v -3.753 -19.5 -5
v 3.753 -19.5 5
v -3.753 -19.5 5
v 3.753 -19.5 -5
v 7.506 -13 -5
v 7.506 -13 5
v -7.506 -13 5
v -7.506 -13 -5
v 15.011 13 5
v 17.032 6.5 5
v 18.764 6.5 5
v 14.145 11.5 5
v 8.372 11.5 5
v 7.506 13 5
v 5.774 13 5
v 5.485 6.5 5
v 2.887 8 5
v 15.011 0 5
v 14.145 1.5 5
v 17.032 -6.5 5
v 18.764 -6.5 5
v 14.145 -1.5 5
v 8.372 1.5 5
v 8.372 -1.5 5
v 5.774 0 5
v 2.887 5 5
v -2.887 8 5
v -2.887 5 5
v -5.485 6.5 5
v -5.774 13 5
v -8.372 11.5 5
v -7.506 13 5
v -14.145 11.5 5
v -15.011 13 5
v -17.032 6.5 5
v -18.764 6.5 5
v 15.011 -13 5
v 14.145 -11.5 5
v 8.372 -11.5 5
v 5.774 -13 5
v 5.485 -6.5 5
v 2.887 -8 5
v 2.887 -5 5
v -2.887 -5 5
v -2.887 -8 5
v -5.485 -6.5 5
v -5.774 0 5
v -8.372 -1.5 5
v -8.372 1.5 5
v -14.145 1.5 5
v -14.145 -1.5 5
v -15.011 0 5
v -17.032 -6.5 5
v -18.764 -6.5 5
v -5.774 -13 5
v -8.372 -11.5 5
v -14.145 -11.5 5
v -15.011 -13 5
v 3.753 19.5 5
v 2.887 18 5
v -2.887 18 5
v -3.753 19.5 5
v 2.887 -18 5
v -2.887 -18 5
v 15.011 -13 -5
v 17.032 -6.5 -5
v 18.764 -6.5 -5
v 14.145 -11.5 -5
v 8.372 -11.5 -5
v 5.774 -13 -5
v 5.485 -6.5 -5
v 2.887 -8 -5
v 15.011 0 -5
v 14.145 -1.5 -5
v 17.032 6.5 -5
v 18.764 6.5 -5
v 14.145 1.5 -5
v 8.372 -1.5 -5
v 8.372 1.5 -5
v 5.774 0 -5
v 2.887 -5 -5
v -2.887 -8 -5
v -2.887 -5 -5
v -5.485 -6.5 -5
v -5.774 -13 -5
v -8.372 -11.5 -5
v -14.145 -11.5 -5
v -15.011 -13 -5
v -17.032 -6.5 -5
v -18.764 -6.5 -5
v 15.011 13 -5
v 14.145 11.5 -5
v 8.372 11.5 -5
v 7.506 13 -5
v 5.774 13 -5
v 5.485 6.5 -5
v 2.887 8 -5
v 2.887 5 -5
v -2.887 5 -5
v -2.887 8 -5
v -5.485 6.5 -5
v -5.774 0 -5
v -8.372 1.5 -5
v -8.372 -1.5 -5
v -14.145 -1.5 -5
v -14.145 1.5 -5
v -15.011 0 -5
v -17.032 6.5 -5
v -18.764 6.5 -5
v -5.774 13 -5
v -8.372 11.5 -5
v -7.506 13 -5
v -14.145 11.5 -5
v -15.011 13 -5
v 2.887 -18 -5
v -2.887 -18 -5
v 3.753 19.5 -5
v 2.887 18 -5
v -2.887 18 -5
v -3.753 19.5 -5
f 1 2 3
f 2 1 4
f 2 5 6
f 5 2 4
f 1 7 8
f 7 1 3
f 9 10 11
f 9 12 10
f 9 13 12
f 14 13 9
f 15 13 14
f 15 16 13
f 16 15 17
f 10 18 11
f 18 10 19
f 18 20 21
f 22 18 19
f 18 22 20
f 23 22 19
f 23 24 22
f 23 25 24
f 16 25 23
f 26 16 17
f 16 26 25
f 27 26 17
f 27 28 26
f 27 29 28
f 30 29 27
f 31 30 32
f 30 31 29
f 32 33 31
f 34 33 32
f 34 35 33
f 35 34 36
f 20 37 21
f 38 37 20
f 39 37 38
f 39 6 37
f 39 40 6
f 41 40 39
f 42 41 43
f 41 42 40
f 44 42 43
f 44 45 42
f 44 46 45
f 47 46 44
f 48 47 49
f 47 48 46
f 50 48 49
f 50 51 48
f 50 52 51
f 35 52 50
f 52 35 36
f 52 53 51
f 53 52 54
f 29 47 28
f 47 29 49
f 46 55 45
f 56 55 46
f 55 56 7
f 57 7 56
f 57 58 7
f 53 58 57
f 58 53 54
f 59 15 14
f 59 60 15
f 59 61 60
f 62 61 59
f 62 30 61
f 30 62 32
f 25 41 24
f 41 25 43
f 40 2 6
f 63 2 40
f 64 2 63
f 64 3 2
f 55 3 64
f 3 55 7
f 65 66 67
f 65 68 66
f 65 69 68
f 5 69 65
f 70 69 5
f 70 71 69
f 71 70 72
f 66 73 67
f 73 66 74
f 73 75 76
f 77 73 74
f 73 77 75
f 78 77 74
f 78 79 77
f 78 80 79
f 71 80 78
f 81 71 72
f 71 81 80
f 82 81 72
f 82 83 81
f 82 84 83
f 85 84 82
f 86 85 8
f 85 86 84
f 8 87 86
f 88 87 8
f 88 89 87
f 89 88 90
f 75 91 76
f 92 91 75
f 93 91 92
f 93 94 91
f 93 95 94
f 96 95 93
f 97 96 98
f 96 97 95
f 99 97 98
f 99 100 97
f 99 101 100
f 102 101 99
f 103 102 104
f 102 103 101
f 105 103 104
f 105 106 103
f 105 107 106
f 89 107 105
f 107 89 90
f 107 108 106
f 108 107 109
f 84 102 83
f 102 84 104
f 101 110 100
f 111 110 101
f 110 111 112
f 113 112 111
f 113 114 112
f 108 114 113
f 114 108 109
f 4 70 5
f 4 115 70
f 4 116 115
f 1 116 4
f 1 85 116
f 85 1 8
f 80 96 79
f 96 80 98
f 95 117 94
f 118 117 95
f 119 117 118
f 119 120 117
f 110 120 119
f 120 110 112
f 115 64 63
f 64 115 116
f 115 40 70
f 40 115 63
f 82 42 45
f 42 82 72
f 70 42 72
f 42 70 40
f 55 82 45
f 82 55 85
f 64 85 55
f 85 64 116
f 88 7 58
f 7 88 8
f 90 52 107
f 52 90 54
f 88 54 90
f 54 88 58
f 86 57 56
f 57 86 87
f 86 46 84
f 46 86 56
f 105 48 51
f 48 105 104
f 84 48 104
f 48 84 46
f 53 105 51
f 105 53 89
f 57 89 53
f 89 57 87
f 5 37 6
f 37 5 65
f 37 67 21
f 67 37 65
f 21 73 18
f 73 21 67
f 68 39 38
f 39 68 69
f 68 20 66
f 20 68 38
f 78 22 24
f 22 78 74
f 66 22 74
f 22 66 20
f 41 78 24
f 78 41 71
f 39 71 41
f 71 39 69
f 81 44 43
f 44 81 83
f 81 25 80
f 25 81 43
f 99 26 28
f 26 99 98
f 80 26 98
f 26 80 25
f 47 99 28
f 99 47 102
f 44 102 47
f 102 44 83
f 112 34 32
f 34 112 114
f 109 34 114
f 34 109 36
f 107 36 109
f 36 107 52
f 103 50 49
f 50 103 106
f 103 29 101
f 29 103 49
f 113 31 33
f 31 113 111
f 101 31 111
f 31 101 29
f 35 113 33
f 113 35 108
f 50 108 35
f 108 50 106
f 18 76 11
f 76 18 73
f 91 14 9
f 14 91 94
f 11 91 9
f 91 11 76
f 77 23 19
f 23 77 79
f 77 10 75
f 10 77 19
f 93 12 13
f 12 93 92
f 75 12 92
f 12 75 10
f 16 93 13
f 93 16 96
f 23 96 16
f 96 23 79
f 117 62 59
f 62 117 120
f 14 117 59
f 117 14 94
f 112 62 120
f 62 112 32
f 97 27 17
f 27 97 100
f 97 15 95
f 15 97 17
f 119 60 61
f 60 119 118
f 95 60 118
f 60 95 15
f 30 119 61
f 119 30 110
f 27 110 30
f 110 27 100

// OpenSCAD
//Tesselated Hexagons


//number of "stacked" cells along a line of symetry
number = 3; //[1, 3, 5, 7, 9, 13]
//distance across flat sides (inradius) 
flats = 10;
//wall thickness - set to 0 and invert to true to make touching tiles
walls = 3; 
//height of comb
height = 10; //[1:10]
//invert = false (honeycomb); invert = true (tiles)
invert = false; //[true, false]



hexTessalation(number = number, h = height, flat = flats, wall = walls, invert = invert);

function flatToRadius(flats) = flats/2/sin(60);


/*
  number = number of hexagons (integer)
  r1 = radius for spacing of hexagonal grid 
  r2 = radius for cutout of honeycomb
  h = height of tiles
  invert = false/true (boolean) 
    - false produces a honeycomb with radius r1 or tiles with no gaps
    - true produces tiles with radius r2 spaced on a gird equal to r1
*/

module hexRow(number = 2, r1 = 10, r2 = 0, h = 2, invert = false) {
  // range to be used in the for loop below
  range = number < 1 ? 0 : number/2-0.5;

  // curve refinement
  $fn = 6;
  for (i = [-range:range]) {
    difference() {
      //invert = true produces honeycomb, invert = true produces hexagons
      if (invert == false) {
        translate([r1*3*i, 0, 0])
          cylinder(r = r1, h = h, center = true);
      }
      if (r2 > 0) {
        //if inverting, make the cutter larger to avoid z fightingv
        cut = invert==false ? 0.01 : 0;       
        translate([r1*3*i, 0, 0])
          cylinder(r = r2, h = h+cut, center = true);
      }
    }
  }

}

/*
  draw a tessalated grid of hexagons
  n = number of hexagons across line of symetry (integer)
  flat = distance across flats for honeycomb cells
  wall = thickness of walls between each cell
  h = height 
*/

/*

  N = number of cells through the vertical line of semmetry (stacked cells)
  total rows along x axis: N * 2 - 1
  turning term: point at which number of rows stops increasing and begins alternating
  even/odd turning term: if the turning term index value is even or odd

  N = 1: [1]
  N = 3: 1, 2, [1], 2, 1
    total: 5
    turning term: 3 [1]

  N = 5: 1, 2, 3, [2, 3, 2], 3, 2, 1
    total: 9
    turning term: 4 [2] (even)

  N = 7: 1, 2, 3, 4, [3, 4, 3, 4, 3], 4, 3, 2, 1
    total: 13
    turning term: 5 [3] (odd)

  N = 9: 1, 2, 3, 4, 5, [4, 5, 4, 5, 4, 5, 4], 5, 4, 3, 2, 1 
    total: 17
    turning term: 6 [4] (even)


*/


module hexTessalation(number = 3, flat = 5, wall = 0, h = 2, invert = false) {
  r1 = flatToRadius(flat+wall); // outside hexagon
  r2 = wall <= 0 ? 0 : flatToRadius(flat); //inside hexagon
  ySpacing = flat+wall;
  yTranslate = ySpacing/2;
  total = number*2-1; // total number of rows in X dimension
  colors = ["red", "yellow", "blue"]; //array of colors to choose from 
  add=[-1, 0]; // array of values to be added depending on odd or even status of i
  
  // N mod 4 identifies odd/even turning terms
  // number%4 = 1: subtract one from even terms, add 0 to odd
  // number%4 = 3: subtract one from odd terms, add 0 to even
  add = [ ["null"], [-1, 0], ["null"], [0, -1] ];

  echo(str("total terms: ", total));
  echo(str("turning term: ", ceil(number/2)+1));

  union(){

  translate([0, -number/2*ySpacing+ySpacing/2, 0])
  for ( i = [1:total]) {
    //bottom 1/3
    if ( i <=ceil(number/2) ) {
      translate([0, yTranslate*i-ySpacing/2, 0])
        //choose color depending on row index
        color(colors[i%3])
        hexRow(number = i, r1 = r1, r2 = r2, h = h, invert = invert);
    }


    //middle 1/3
    if ( ceil(number/2)+1 <= i && i <=ceil(number/2)+1+number-3) {
      translate([0, yTranslate*i-ySpacing/2, 0])
        color(colors[i%3])
          //add 0 or subtract 1 
          hexRow(number = ceil(number/2)+add[number%4][i%2], 
          r1 = r1, r2 = r2, h = h, invert = invert);

    }

    if ( ceil(number/2)+1 +number-3 < i ) {
      translate([0, yTranslate*i-ySpacing/2, 0])
        color(colors[i%3])
        hexRow(number = total+1-i, 
          r1 = r1, r2 = r2, h = h, invert = invert);
//      echo("3/3", i, total+1-i);
    }
  }
  }
}

//hexTessalation(number = 5, flat = 10, wall = 5, invert = false);
//hexTessalation(number = 5, flat = 10, wall = 5, invert = false);

//hexRow(3, r1 = 10, r2 = 9.9, invert = false);
